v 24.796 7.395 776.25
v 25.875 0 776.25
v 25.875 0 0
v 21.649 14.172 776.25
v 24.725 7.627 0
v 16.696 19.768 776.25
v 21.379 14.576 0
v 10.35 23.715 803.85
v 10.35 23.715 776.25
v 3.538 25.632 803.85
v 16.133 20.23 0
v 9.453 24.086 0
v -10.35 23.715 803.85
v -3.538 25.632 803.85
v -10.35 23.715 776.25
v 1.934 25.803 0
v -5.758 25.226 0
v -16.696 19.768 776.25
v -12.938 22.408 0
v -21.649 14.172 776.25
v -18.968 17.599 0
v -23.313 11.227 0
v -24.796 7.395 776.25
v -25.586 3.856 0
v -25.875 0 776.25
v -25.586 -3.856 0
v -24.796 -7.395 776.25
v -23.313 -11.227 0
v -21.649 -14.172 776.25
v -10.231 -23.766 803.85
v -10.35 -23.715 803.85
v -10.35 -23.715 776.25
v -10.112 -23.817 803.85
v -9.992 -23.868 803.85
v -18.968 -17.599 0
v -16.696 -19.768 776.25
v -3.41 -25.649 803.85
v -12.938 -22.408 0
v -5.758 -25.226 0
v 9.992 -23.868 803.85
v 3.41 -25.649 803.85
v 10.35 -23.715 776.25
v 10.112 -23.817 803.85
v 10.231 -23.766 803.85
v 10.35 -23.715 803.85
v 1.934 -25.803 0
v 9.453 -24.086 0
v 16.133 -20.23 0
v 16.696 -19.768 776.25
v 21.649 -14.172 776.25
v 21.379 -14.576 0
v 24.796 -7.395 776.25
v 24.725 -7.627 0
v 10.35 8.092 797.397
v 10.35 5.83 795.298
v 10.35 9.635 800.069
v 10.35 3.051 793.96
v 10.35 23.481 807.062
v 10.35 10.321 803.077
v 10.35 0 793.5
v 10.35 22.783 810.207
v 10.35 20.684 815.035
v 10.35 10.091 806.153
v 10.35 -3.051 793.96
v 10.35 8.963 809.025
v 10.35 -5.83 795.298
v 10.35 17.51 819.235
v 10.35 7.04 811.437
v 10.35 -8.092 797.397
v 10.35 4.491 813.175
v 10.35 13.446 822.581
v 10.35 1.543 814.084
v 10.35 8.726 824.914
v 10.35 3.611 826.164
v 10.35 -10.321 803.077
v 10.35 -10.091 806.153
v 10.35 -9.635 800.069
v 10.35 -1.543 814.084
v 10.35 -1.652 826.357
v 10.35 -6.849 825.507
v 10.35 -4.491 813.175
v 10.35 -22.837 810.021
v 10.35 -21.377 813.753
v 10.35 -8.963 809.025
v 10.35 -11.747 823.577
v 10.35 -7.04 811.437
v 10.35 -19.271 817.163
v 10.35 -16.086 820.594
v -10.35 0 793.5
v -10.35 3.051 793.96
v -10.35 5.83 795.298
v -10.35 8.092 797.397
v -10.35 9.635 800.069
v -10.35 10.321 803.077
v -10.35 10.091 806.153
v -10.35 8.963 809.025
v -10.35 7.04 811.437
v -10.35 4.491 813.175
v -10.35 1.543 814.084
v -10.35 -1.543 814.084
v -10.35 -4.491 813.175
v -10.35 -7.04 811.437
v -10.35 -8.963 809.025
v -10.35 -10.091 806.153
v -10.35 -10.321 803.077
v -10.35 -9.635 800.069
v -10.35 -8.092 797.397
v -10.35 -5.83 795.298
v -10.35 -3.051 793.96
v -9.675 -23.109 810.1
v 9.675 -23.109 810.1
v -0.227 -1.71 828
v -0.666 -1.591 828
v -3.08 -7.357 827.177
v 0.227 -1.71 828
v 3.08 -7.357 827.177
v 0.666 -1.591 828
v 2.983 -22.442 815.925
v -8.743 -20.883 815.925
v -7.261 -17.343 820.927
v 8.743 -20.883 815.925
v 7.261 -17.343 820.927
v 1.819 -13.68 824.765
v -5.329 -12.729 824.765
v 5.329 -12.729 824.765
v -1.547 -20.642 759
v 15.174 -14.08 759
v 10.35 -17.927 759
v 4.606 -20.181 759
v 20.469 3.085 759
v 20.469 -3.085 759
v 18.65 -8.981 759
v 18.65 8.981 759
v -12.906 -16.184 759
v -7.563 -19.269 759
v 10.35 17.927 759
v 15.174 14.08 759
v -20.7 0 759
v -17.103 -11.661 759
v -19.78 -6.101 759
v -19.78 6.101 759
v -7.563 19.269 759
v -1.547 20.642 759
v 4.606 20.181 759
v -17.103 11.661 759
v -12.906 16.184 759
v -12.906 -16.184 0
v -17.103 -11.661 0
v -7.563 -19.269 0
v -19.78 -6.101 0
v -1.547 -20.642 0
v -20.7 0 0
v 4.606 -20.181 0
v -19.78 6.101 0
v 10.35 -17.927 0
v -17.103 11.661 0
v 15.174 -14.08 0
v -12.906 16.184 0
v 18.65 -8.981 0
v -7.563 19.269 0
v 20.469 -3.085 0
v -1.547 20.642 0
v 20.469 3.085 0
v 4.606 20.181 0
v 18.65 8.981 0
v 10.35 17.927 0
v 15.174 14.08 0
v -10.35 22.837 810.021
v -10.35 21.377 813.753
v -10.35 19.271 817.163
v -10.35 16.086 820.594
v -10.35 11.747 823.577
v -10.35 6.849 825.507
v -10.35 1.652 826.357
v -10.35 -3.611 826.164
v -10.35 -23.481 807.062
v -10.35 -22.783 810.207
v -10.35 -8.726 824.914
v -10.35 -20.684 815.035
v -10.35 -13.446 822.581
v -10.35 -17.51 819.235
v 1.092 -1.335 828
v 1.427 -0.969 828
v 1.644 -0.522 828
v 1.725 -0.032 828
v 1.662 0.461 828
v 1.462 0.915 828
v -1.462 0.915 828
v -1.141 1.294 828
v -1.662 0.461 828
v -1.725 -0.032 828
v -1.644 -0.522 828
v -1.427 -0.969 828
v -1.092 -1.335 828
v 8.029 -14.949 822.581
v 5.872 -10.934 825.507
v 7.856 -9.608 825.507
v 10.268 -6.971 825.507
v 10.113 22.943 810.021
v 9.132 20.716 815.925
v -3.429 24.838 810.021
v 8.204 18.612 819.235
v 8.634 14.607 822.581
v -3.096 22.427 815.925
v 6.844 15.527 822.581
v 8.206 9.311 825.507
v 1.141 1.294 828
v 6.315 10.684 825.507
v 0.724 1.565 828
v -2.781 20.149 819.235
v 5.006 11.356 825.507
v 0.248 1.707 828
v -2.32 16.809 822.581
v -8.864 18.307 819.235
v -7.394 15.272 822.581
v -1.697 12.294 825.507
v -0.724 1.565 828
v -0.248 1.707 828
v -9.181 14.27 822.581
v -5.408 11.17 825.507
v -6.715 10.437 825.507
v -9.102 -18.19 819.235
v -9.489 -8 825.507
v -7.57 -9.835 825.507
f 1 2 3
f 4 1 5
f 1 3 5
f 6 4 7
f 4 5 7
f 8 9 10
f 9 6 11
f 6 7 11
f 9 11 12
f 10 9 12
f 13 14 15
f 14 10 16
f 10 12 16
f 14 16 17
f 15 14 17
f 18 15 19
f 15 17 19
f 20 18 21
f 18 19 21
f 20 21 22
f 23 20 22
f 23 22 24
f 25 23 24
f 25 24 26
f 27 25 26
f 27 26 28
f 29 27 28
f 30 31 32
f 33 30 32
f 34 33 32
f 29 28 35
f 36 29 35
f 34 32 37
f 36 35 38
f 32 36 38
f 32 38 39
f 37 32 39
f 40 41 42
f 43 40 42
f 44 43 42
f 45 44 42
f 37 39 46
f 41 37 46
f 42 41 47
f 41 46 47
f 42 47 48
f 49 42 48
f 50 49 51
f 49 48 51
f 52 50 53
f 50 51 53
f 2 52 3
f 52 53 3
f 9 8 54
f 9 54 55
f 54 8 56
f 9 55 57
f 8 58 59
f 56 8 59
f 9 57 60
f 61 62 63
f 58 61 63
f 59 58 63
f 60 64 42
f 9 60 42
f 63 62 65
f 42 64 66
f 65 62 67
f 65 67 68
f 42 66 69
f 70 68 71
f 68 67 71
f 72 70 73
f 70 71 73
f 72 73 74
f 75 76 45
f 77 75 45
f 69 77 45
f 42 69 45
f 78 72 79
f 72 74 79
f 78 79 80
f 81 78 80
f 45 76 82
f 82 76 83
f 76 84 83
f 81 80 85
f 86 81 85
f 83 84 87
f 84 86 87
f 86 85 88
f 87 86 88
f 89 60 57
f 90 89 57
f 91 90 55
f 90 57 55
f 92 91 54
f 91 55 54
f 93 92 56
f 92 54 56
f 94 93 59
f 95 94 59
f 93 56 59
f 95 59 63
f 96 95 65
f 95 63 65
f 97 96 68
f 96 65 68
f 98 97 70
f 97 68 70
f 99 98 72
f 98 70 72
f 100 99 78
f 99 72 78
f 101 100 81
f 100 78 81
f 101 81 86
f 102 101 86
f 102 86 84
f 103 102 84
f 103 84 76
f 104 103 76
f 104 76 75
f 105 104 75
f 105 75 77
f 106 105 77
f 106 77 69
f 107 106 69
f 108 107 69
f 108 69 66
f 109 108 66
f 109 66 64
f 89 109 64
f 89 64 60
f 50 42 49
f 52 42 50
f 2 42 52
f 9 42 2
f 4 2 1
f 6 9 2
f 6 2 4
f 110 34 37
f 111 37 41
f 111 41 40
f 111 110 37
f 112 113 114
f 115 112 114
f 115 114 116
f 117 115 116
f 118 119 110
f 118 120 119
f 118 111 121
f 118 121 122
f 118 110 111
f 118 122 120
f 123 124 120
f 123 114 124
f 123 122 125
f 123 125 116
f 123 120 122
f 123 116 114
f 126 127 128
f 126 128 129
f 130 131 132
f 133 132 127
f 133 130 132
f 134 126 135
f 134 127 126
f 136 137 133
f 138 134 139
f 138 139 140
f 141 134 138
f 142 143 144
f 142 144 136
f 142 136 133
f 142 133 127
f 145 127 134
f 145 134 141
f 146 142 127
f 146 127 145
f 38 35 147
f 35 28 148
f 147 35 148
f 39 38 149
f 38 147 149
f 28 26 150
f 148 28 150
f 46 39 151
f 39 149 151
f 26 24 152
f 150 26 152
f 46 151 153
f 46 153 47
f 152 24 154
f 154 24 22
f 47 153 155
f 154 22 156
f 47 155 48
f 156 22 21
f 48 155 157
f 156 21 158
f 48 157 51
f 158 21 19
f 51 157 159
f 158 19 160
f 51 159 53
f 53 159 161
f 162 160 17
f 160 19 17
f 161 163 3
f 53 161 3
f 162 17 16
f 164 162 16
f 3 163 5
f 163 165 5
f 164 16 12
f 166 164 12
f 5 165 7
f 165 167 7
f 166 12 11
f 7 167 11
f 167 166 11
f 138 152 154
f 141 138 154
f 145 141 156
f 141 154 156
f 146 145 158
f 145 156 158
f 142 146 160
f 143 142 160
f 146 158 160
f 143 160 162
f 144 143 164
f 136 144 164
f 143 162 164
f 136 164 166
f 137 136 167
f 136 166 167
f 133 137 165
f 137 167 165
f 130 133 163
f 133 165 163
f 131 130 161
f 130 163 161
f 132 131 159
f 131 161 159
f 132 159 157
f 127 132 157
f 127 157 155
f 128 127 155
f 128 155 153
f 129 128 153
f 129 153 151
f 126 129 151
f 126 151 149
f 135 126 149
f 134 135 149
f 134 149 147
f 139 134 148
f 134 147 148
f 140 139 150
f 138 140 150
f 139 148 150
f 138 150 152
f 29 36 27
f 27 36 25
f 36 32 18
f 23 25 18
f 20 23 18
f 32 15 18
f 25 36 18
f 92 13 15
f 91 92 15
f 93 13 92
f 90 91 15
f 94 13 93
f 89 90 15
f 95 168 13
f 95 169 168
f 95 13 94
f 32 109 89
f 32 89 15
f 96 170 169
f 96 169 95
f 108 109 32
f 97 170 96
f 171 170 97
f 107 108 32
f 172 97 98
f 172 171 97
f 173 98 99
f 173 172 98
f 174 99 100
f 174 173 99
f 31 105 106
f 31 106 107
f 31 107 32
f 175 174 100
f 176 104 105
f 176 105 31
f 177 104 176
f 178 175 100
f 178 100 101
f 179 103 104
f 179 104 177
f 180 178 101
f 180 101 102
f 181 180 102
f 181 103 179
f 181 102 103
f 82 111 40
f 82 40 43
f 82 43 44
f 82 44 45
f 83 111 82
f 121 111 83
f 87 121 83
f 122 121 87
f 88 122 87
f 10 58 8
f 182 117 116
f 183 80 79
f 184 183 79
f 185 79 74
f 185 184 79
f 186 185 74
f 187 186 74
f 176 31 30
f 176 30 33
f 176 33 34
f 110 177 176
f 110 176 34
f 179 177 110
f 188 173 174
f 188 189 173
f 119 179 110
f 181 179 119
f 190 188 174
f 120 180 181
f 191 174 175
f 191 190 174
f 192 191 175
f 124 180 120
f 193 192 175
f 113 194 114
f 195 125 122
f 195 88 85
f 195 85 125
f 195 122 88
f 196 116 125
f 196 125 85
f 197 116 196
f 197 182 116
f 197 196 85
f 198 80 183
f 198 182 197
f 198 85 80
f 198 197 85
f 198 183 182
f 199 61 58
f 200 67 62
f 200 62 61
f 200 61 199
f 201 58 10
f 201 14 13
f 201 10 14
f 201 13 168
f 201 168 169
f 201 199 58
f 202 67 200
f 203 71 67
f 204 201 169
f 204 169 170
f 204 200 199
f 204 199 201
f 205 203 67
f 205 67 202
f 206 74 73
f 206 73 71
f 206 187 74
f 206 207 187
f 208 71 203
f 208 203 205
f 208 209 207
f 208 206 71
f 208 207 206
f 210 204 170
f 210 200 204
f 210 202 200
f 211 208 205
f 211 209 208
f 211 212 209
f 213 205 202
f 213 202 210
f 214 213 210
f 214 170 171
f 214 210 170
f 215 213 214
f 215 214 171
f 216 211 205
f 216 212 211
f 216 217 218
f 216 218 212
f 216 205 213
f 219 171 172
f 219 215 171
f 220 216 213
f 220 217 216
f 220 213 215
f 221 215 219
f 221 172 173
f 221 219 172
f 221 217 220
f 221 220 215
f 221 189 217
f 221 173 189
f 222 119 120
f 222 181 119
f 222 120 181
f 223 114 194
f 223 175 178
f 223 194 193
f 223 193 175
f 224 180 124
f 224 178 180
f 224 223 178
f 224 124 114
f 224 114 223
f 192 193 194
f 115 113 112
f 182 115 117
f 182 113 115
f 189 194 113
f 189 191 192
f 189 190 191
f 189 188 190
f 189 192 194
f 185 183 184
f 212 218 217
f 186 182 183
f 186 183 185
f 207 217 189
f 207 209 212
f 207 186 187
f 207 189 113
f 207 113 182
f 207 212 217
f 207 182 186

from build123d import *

# Parameters (mm, degrees)
SKETCH_1_R          = 75
EXTRUDE_1_DEPTH     = 2400
CUT_EXTRUDE_1_DEPTH = 150
SKETCH_3_R          = 30
CUT_EXTRUDE_2_DEPTH = 150
FILLET_1_R          = 70
SKETCH_4_R          = 60
CUT_EXTRUDE_4_DEPTH = 2200
SCALE_1_SCALE       = 0.345


with BuildPart() as part:
    # 草图1 → 凸台-拉伸1 (new body)
    with BuildSketch(Plane.XY):
        Circle(SKETCH_1_R)
    extrude(amount=EXTRUDE_1_DEPTH)

    # 草图2 → 切除-拉伸1 (cut)
    with BuildSketch(Plane.XY.offset(2400)):
        Polygon((-30, 75), (-30, -75), (-133.073279379, -42.369308492), (-77.396642949, 65.414797111), align=None)
        Polygon((30, 75), (30, -75), (106.458623503, -47.875789018), (106.458623503, 55.829594222), align=None)
    extrude(amount=-CUT_EXTRUDE_1_DEPTH, mode=Mode.SUBTRACT)

    # 草图3 → 切除-拉伸2 (cut)
    with BuildSketch(Plane(origin=(30, 0, 0), x_dir=(0, 0, -1), z_dir=(1, 0, 0))):
        with Locations((-2330, 0)):
            Circle(SKETCH_3_R)
    extrude(amount=-CUT_EXTRUDE_2_DEPTH, mode=Mode.SUBTRACT)

    # 圆角1
    # the kernel refuses this fillet: 70 mm, written as the material it takes off along each edge
    with BuildSketch(Plane(origin=(0, 0, 2400), x_dir=(0.3861785994276561, -0.922424029036589, 0), z_dir=(-0.922424029036589, -0.3861785994276561, 0))) as fillet_1_piece_1:
        with BuildLine():
            CenterArc((75 - FILLET_1_R, -FILLET_1_R), FILLET_1_R, 0, 90)
            Line((75 - FILLET_1_R, 0), (75, 0))
            Line((75, 0), (75, -FILLET_1_R))
        make_face()
    revolve(axis=Axis((0, 0, 2400), (0, 0, 1)), revolution_arc=314.566142673, mode=Mode.SUBTRACT)
    with BuildSketch(Plane(origin=(0, 0, 2400), x_dir=(-0.386178599427656, 0.922424029036589, 0), z_dir=(0.922424029036589, 0.386178599427656, 0))) as fillet_1_piece_2:
        with BuildLine():
            CenterArc((75 - FILLET_1_R, -FILLET_1_R), FILLET_1_R, 0, 90)
            Line((75 - FILLET_1_R, 0), (75, 0))
            Line((75, 0), (75, -FILLET_1_R))
        make_face()
    revolve(axis=Axis((0, 0, 2400), (0, 0, 1)), revolution_arc=314.566142673, mode=Mode.SUBTRACT)

    # 草图4 → 切除-拉伸4 (cut)
    with BuildSketch(Plane(origin=(0, 0, 0), x_dir=(-1, 0, 0), z_dir=(0, 0, -1))):
        Circle(SKETCH_4_R)
    extrude(amount=-CUT_EXTRUDE_4_DEPTH, mode=Mode.SUBTRACT)


with BuildPart() as part_1:
    # 缩放比例1: scaled about (0, 0, 0)
    add(part.part.scale(SCALE_1_SCALE))


solid = part_1.part
